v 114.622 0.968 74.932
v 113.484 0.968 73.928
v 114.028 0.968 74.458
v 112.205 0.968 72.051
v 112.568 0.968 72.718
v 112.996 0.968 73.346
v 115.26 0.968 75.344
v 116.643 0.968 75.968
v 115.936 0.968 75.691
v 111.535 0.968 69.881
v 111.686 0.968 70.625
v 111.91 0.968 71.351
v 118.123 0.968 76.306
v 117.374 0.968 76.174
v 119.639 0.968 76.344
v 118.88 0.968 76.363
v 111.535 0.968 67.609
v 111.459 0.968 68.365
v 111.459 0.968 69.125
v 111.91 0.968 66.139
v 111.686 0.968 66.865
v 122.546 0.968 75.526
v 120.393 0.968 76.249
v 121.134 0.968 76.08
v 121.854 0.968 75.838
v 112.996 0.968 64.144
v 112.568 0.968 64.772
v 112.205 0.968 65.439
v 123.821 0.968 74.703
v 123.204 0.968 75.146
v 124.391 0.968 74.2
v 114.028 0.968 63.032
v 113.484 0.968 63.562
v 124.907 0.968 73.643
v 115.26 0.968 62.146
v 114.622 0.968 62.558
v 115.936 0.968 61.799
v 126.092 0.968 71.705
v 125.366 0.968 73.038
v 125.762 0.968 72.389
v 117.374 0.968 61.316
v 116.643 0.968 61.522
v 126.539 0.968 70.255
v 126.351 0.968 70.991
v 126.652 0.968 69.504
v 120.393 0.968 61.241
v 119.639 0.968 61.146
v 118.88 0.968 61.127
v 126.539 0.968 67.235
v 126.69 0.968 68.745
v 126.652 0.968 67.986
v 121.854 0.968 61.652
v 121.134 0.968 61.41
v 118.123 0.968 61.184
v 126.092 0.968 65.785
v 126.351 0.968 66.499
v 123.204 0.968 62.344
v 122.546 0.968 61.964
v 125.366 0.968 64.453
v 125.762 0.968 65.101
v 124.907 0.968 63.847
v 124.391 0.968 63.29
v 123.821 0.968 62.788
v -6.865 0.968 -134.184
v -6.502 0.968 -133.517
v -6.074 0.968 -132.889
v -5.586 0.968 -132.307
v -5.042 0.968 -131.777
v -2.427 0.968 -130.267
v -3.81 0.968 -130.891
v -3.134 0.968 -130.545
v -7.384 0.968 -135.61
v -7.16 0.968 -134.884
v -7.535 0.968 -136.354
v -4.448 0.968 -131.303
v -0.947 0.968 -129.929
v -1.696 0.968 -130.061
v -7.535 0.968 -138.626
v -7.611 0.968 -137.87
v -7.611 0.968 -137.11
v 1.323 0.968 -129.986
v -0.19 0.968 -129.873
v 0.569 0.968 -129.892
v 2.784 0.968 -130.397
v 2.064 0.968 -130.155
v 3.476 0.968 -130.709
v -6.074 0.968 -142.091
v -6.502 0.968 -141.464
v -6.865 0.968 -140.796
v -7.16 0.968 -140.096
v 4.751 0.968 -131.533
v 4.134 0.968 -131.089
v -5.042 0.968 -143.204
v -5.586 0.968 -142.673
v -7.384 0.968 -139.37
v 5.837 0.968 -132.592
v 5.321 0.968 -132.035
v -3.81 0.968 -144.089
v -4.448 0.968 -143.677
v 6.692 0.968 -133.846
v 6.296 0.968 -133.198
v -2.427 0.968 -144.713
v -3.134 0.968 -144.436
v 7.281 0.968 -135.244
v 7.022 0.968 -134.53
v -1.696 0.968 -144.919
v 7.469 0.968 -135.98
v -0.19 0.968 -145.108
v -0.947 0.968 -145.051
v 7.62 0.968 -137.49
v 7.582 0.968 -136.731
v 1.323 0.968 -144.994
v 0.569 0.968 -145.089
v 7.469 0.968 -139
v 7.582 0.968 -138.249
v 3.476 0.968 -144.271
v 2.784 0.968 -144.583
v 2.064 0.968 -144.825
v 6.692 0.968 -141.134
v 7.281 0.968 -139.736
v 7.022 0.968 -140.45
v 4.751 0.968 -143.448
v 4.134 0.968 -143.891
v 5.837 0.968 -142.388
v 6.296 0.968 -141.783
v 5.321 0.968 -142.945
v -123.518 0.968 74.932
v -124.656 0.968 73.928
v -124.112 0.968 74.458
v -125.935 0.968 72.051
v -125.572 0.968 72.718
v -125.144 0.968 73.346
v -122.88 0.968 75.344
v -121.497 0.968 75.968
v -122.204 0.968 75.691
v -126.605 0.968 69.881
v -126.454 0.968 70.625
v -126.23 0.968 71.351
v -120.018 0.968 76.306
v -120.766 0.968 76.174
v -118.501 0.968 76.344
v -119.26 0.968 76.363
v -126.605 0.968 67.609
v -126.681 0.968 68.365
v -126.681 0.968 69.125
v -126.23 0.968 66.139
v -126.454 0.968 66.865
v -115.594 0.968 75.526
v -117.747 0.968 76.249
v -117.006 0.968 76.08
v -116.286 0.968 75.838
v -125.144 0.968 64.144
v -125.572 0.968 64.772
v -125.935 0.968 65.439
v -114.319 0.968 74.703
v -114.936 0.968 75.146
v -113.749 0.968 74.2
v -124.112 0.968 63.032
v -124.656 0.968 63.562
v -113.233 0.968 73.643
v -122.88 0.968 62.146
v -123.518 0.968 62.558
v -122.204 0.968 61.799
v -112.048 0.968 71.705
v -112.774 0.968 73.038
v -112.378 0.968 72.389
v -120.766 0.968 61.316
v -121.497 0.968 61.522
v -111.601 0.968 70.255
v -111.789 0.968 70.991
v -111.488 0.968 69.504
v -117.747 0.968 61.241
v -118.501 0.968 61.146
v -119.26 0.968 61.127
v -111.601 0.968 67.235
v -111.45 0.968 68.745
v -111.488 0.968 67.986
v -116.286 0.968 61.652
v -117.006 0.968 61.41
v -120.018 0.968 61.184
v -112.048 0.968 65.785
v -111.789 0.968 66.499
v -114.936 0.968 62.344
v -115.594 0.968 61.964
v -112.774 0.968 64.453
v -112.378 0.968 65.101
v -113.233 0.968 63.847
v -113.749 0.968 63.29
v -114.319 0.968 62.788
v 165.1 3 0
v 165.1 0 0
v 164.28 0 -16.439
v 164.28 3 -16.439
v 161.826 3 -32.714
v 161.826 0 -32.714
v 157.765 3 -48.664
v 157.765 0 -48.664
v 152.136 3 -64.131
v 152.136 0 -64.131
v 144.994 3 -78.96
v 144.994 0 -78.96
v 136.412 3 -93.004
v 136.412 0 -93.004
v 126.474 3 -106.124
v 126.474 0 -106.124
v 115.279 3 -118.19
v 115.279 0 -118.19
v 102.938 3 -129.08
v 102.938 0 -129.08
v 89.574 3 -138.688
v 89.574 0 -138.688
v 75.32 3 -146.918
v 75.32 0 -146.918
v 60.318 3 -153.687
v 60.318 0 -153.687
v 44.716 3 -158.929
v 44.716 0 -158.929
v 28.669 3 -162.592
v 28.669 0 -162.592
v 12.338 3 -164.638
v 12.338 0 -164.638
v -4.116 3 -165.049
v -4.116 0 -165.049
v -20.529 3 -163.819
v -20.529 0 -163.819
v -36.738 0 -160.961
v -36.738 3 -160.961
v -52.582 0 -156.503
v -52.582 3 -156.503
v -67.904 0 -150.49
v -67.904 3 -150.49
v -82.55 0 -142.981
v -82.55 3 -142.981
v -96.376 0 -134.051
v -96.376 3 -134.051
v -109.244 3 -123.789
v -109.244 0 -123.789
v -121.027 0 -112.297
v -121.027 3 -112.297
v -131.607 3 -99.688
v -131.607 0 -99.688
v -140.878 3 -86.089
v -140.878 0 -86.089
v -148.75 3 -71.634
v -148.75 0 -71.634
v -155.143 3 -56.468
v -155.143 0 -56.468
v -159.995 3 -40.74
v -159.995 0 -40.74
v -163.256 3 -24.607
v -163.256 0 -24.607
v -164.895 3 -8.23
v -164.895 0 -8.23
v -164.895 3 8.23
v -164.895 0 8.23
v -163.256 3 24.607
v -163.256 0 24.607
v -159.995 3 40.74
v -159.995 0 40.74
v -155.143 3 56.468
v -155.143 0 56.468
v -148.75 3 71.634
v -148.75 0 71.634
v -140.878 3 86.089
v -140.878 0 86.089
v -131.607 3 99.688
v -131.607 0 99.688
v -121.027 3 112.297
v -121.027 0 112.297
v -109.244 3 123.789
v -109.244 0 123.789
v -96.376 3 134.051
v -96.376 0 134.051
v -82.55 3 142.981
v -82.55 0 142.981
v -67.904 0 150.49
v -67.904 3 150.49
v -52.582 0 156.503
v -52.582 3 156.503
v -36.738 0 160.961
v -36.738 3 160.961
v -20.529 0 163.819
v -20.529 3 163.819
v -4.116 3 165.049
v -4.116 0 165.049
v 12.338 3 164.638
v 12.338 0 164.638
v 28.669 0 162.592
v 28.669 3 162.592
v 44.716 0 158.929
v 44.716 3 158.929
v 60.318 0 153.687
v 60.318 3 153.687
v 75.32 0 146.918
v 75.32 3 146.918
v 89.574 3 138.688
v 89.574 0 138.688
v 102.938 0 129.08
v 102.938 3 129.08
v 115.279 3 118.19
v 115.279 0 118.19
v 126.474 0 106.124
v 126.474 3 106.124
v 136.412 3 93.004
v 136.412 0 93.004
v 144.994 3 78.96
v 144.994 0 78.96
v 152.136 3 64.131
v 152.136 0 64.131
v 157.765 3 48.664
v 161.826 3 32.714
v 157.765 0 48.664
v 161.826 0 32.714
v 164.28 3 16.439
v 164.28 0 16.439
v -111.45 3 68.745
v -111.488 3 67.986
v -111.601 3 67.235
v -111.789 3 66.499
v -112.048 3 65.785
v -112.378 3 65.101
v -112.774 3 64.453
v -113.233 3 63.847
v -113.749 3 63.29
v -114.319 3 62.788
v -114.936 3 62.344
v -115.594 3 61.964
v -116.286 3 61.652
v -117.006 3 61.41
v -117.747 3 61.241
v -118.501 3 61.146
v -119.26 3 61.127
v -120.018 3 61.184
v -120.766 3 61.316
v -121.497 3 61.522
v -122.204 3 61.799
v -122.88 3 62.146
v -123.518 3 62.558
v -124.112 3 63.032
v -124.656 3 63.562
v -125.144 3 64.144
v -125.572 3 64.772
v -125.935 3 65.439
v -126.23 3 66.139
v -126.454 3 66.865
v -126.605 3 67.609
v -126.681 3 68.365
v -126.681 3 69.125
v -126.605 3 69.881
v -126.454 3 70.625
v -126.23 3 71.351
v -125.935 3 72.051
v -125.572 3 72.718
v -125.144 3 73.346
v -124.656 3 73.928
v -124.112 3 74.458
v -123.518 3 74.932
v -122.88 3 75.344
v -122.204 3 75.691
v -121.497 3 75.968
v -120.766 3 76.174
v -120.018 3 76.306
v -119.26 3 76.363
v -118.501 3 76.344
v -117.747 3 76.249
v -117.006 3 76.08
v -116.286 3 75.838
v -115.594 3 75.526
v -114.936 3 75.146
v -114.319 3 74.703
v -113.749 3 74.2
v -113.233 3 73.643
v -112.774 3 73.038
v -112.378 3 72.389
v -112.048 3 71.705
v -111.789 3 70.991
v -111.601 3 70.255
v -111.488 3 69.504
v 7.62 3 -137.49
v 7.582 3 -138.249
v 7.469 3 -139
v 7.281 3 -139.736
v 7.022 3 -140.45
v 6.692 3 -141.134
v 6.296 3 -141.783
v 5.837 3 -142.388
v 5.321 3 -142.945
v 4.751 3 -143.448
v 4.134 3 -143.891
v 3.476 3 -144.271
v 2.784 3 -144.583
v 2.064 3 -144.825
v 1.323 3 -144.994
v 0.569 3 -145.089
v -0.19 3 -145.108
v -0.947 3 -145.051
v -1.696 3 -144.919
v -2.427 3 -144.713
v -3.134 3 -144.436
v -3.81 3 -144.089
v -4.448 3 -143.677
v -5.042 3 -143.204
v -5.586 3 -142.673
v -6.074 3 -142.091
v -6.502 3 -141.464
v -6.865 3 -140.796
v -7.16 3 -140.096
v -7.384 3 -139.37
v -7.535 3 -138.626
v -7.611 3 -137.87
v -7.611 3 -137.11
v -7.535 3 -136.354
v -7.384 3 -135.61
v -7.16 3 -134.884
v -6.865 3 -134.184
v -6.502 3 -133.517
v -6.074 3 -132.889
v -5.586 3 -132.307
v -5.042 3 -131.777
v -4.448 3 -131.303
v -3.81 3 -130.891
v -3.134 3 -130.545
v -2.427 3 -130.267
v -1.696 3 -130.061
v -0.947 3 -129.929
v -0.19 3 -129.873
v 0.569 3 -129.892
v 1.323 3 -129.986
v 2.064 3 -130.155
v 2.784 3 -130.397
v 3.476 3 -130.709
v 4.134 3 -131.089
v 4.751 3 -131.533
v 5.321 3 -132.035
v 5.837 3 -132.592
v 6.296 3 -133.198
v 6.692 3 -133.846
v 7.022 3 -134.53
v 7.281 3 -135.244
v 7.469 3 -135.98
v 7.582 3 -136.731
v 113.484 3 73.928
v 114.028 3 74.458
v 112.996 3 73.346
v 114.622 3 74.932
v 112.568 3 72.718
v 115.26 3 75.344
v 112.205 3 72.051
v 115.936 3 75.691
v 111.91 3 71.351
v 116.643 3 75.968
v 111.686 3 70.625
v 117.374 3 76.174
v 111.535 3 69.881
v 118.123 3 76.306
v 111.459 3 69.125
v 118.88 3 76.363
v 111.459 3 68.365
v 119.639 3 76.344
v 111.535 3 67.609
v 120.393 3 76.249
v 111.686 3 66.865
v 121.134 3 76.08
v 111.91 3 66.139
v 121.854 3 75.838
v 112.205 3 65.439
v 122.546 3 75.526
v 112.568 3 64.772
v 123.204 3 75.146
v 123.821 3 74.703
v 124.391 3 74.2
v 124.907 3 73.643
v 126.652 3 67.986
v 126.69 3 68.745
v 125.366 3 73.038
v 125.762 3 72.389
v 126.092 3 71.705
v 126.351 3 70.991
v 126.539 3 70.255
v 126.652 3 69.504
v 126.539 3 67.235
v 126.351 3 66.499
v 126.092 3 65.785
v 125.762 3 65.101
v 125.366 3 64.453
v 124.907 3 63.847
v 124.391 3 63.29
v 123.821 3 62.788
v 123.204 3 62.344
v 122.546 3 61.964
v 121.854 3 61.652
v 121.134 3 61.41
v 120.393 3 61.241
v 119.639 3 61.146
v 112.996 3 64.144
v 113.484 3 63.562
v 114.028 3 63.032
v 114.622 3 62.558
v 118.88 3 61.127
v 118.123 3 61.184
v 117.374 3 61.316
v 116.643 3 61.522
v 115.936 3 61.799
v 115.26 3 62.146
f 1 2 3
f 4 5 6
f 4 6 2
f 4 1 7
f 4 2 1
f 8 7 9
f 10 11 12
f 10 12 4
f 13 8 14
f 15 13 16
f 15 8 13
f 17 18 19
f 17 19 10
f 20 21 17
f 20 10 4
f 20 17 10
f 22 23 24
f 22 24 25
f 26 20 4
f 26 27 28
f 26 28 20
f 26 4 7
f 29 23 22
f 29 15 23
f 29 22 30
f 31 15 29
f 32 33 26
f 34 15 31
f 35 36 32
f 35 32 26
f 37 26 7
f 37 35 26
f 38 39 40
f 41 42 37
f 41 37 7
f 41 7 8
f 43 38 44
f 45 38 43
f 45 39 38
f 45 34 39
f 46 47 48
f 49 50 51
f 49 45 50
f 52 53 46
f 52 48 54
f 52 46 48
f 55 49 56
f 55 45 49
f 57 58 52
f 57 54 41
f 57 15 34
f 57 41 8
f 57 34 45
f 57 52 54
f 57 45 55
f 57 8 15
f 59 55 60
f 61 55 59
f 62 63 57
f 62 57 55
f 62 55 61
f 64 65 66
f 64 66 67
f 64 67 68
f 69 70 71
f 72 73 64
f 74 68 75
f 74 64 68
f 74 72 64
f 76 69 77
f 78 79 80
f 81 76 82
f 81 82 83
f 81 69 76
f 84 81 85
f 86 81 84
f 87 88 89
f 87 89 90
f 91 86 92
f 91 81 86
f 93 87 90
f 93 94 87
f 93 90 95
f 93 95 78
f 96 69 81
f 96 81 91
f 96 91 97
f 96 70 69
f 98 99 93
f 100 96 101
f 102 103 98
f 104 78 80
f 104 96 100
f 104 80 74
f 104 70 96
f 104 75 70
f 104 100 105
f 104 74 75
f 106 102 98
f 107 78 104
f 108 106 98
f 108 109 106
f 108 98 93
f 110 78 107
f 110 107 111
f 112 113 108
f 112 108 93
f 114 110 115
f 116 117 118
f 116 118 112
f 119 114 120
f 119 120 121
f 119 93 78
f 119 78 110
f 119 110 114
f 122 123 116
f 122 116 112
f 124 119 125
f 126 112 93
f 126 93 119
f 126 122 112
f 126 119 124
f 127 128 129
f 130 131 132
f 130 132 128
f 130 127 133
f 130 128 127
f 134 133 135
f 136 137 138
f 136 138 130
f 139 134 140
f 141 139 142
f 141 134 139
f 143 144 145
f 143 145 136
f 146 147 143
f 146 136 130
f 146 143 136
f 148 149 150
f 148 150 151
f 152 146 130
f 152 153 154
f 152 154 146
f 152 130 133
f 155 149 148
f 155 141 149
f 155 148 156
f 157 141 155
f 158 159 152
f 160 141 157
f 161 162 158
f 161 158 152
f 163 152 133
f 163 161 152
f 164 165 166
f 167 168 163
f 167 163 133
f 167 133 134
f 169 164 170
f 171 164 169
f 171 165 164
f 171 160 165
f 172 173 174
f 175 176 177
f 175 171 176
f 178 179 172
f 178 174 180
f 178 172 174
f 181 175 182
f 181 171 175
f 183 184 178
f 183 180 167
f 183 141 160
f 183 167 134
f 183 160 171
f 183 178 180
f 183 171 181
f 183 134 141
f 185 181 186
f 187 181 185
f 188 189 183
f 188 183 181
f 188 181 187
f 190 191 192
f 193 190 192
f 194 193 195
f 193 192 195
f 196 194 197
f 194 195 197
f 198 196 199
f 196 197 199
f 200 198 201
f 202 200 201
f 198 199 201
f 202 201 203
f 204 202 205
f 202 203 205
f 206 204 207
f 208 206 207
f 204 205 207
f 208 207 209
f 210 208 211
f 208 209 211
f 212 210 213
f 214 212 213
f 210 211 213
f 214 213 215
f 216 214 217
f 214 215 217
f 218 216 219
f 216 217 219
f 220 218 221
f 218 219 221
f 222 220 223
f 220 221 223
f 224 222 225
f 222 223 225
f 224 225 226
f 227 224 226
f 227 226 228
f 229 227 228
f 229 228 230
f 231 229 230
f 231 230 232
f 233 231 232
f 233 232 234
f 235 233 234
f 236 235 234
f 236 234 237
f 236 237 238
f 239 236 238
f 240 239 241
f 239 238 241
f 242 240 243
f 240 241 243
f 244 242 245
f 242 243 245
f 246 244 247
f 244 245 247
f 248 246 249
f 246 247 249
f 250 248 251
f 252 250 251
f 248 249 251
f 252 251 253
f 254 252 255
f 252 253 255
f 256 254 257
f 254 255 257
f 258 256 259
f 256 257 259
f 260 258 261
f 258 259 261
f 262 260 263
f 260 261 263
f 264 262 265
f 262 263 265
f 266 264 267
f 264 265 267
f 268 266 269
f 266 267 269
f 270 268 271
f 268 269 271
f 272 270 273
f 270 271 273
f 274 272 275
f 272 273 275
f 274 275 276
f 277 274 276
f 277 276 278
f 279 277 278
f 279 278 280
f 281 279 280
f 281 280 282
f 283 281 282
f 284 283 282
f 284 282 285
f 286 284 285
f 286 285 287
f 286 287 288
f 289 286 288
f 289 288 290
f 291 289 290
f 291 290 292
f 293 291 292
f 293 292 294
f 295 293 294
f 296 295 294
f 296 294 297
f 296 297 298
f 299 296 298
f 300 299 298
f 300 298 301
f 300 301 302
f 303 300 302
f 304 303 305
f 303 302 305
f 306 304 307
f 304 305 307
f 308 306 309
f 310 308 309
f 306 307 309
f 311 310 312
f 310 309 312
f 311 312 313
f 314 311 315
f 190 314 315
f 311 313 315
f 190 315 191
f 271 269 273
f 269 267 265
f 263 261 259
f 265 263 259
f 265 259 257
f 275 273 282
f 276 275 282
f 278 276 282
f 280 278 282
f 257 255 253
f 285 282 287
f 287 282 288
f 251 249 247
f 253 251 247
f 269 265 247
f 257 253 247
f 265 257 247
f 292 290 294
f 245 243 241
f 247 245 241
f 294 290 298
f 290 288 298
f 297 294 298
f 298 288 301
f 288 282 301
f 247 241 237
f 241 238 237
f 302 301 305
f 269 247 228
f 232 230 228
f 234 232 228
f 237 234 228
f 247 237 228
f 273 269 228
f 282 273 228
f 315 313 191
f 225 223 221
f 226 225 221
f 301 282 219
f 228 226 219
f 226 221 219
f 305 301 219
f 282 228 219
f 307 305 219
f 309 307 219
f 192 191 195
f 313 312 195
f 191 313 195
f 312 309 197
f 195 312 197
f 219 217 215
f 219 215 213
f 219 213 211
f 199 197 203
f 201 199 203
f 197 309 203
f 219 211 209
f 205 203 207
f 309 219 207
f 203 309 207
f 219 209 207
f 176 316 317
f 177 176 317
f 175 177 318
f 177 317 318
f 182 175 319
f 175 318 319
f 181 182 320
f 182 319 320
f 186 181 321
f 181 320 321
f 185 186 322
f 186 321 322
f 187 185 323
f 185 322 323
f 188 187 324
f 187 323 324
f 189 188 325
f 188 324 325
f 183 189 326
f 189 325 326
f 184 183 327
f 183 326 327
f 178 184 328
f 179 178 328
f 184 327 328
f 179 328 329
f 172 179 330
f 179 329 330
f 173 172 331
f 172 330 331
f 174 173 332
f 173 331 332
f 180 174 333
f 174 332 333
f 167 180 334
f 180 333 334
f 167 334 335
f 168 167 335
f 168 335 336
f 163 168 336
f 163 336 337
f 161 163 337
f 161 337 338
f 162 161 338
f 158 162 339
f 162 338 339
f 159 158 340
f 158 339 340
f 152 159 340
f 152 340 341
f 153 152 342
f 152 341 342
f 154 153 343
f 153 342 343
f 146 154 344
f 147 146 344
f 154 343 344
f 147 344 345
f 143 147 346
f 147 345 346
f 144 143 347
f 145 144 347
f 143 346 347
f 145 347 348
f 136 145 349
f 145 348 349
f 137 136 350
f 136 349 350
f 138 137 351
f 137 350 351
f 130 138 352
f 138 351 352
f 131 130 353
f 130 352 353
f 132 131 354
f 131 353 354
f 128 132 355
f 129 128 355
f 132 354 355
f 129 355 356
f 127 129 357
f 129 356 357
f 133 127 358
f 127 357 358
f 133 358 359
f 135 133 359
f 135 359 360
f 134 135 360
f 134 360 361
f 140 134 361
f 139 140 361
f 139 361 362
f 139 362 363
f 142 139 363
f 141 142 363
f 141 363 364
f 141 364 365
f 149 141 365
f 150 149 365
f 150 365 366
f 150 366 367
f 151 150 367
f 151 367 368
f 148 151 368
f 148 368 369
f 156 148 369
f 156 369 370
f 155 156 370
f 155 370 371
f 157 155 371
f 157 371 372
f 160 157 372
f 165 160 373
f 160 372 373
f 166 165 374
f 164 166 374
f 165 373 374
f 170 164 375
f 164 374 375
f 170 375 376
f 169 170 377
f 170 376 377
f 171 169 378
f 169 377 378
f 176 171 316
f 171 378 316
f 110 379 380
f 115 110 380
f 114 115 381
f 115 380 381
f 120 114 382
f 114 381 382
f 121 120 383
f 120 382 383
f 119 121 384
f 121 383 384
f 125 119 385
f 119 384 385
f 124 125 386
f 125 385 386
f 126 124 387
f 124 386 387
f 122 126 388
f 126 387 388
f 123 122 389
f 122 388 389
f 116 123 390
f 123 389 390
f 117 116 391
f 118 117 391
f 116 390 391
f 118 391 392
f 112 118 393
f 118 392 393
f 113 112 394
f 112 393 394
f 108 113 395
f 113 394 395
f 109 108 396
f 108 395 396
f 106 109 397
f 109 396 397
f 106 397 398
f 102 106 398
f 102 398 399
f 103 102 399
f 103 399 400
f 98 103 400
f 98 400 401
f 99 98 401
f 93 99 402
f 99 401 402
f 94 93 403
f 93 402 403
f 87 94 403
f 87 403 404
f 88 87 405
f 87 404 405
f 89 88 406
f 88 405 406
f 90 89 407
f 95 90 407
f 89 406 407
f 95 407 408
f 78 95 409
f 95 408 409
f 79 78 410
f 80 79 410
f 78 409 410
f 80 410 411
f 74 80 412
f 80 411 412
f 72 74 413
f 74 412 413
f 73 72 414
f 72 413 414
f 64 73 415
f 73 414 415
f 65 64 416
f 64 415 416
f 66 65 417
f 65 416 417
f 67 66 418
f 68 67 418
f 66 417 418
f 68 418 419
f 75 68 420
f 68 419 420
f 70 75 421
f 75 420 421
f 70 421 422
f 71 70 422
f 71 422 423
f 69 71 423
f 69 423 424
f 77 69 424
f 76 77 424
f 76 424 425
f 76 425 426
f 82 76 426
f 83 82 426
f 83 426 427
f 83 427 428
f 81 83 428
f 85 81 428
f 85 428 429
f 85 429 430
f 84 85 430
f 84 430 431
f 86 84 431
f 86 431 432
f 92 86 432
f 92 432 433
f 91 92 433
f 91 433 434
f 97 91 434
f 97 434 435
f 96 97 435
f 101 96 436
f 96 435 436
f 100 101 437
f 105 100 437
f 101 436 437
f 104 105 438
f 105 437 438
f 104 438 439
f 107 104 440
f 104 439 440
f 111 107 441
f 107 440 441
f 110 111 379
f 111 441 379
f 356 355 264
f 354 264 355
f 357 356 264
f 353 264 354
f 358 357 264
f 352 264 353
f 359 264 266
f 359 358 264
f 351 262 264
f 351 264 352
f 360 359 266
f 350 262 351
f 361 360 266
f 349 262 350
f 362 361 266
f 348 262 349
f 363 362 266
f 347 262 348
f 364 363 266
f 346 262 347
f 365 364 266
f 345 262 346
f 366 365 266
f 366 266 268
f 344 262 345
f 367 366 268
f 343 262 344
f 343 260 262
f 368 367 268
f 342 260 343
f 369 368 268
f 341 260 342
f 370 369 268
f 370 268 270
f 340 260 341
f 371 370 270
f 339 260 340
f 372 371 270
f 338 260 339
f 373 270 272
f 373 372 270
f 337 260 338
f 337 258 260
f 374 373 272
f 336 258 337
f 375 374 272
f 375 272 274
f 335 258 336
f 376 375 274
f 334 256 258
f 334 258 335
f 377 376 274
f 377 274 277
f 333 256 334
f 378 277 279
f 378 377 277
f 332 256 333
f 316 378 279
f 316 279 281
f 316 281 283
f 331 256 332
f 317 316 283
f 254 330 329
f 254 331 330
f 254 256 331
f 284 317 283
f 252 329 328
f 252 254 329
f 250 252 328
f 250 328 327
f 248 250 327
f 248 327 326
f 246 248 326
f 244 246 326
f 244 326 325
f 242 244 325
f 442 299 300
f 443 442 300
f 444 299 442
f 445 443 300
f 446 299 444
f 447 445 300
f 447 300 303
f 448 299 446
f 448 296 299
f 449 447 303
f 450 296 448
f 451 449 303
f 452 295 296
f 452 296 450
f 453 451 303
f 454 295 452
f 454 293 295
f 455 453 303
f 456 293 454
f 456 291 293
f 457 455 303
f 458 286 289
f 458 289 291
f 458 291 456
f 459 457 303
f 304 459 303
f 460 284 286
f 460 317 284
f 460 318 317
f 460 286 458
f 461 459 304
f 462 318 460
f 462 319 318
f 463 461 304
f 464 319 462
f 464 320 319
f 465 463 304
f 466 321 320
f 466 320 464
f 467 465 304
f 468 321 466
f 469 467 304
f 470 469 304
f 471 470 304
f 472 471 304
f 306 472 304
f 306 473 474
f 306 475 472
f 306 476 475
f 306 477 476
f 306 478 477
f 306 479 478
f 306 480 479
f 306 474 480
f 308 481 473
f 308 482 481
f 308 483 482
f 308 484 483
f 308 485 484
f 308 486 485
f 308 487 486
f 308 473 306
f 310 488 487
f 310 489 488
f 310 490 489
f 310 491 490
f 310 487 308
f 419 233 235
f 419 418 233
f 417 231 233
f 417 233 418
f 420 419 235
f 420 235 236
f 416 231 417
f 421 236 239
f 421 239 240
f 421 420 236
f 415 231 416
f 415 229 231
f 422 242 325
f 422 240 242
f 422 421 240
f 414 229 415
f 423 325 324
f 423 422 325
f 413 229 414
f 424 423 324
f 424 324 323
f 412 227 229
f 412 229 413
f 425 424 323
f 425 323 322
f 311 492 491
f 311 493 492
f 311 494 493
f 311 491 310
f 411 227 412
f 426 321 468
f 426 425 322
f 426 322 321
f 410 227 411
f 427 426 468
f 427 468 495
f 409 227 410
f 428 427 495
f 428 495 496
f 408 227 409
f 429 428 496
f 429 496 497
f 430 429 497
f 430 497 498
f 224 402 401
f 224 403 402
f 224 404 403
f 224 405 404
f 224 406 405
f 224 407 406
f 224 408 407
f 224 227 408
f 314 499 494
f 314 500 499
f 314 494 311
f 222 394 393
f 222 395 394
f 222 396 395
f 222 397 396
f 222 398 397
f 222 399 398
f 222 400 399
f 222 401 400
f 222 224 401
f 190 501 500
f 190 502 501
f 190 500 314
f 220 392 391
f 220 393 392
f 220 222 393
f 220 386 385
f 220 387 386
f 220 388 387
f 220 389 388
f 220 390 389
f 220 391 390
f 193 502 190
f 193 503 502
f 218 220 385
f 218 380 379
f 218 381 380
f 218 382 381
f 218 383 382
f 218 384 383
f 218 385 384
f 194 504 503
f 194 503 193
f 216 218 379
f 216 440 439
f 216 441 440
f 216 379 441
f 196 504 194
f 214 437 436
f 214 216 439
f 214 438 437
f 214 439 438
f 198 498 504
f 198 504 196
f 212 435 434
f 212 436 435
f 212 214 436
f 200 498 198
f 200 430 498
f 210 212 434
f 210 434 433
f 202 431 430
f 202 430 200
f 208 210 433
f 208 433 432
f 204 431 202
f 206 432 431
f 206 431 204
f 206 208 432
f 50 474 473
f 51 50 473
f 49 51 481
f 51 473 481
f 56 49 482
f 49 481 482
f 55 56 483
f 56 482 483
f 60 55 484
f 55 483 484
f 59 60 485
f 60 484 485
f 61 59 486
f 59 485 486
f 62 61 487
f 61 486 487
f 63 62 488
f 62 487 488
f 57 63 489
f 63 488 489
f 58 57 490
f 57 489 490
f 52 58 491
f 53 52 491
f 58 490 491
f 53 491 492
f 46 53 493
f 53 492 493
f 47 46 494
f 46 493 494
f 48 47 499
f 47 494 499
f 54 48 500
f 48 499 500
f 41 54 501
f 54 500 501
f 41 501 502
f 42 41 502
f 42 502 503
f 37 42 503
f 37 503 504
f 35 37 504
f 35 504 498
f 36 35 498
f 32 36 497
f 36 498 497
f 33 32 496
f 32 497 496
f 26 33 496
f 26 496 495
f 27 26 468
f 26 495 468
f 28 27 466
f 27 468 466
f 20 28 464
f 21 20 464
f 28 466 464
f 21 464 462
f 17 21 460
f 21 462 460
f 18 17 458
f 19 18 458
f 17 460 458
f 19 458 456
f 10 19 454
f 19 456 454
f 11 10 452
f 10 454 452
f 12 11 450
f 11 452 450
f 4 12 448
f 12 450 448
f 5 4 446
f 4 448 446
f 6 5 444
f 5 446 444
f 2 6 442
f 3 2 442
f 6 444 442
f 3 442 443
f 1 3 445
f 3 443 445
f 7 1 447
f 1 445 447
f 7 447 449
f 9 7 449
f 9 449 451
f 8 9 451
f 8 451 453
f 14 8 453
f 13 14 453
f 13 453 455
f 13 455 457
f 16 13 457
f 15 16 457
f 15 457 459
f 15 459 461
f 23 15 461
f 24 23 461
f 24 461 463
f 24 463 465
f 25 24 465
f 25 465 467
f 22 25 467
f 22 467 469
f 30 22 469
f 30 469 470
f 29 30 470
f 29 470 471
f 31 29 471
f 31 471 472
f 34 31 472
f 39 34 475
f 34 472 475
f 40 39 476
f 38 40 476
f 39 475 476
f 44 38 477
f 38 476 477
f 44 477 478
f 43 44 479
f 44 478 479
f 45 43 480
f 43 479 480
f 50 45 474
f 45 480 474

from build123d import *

# Parameters (mm, degrees)
SKETCH1_R           = 165.1
BOSS_EXTRUDE1_DEPTH = 3
SKETCH2_R           = 7.62
CUT_EXTRUDE1_DEPTH  = 2.032


with BuildPart() as part:
    # Sketch1 → Boss-Extrude1 (new body)
    with BuildSketch(Plane(origin=(0, 0, 0), x_dir=(1, 0, 0), z_dir=(0, 1, 0))):
        Circle(SKETCH1_R)
    extrude(amount=BOSS_EXTRUDE1_DEPTH)

    # Sketch2 → Cut-Extrude1 (cut)
    with BuildSketch(Plane(origin=(0, 3, 0), x_dir=(1, 0, 0), z_dir=(0, 1, 0))):
        with Locations((0, 137.4902)):
            Circle(SKETCH2_R)
        with Locations((119.070005971, -68.7451)):
            Circle(SKETCH2_R)
        with Locations((-119.070005971, -68.7451)):
            Circle(SKETCH2_R)
    extrude(amount=-CUT_EXTRUDE1_DEPTH, mode=Mode.SUBTRACT)


solid = part.part
